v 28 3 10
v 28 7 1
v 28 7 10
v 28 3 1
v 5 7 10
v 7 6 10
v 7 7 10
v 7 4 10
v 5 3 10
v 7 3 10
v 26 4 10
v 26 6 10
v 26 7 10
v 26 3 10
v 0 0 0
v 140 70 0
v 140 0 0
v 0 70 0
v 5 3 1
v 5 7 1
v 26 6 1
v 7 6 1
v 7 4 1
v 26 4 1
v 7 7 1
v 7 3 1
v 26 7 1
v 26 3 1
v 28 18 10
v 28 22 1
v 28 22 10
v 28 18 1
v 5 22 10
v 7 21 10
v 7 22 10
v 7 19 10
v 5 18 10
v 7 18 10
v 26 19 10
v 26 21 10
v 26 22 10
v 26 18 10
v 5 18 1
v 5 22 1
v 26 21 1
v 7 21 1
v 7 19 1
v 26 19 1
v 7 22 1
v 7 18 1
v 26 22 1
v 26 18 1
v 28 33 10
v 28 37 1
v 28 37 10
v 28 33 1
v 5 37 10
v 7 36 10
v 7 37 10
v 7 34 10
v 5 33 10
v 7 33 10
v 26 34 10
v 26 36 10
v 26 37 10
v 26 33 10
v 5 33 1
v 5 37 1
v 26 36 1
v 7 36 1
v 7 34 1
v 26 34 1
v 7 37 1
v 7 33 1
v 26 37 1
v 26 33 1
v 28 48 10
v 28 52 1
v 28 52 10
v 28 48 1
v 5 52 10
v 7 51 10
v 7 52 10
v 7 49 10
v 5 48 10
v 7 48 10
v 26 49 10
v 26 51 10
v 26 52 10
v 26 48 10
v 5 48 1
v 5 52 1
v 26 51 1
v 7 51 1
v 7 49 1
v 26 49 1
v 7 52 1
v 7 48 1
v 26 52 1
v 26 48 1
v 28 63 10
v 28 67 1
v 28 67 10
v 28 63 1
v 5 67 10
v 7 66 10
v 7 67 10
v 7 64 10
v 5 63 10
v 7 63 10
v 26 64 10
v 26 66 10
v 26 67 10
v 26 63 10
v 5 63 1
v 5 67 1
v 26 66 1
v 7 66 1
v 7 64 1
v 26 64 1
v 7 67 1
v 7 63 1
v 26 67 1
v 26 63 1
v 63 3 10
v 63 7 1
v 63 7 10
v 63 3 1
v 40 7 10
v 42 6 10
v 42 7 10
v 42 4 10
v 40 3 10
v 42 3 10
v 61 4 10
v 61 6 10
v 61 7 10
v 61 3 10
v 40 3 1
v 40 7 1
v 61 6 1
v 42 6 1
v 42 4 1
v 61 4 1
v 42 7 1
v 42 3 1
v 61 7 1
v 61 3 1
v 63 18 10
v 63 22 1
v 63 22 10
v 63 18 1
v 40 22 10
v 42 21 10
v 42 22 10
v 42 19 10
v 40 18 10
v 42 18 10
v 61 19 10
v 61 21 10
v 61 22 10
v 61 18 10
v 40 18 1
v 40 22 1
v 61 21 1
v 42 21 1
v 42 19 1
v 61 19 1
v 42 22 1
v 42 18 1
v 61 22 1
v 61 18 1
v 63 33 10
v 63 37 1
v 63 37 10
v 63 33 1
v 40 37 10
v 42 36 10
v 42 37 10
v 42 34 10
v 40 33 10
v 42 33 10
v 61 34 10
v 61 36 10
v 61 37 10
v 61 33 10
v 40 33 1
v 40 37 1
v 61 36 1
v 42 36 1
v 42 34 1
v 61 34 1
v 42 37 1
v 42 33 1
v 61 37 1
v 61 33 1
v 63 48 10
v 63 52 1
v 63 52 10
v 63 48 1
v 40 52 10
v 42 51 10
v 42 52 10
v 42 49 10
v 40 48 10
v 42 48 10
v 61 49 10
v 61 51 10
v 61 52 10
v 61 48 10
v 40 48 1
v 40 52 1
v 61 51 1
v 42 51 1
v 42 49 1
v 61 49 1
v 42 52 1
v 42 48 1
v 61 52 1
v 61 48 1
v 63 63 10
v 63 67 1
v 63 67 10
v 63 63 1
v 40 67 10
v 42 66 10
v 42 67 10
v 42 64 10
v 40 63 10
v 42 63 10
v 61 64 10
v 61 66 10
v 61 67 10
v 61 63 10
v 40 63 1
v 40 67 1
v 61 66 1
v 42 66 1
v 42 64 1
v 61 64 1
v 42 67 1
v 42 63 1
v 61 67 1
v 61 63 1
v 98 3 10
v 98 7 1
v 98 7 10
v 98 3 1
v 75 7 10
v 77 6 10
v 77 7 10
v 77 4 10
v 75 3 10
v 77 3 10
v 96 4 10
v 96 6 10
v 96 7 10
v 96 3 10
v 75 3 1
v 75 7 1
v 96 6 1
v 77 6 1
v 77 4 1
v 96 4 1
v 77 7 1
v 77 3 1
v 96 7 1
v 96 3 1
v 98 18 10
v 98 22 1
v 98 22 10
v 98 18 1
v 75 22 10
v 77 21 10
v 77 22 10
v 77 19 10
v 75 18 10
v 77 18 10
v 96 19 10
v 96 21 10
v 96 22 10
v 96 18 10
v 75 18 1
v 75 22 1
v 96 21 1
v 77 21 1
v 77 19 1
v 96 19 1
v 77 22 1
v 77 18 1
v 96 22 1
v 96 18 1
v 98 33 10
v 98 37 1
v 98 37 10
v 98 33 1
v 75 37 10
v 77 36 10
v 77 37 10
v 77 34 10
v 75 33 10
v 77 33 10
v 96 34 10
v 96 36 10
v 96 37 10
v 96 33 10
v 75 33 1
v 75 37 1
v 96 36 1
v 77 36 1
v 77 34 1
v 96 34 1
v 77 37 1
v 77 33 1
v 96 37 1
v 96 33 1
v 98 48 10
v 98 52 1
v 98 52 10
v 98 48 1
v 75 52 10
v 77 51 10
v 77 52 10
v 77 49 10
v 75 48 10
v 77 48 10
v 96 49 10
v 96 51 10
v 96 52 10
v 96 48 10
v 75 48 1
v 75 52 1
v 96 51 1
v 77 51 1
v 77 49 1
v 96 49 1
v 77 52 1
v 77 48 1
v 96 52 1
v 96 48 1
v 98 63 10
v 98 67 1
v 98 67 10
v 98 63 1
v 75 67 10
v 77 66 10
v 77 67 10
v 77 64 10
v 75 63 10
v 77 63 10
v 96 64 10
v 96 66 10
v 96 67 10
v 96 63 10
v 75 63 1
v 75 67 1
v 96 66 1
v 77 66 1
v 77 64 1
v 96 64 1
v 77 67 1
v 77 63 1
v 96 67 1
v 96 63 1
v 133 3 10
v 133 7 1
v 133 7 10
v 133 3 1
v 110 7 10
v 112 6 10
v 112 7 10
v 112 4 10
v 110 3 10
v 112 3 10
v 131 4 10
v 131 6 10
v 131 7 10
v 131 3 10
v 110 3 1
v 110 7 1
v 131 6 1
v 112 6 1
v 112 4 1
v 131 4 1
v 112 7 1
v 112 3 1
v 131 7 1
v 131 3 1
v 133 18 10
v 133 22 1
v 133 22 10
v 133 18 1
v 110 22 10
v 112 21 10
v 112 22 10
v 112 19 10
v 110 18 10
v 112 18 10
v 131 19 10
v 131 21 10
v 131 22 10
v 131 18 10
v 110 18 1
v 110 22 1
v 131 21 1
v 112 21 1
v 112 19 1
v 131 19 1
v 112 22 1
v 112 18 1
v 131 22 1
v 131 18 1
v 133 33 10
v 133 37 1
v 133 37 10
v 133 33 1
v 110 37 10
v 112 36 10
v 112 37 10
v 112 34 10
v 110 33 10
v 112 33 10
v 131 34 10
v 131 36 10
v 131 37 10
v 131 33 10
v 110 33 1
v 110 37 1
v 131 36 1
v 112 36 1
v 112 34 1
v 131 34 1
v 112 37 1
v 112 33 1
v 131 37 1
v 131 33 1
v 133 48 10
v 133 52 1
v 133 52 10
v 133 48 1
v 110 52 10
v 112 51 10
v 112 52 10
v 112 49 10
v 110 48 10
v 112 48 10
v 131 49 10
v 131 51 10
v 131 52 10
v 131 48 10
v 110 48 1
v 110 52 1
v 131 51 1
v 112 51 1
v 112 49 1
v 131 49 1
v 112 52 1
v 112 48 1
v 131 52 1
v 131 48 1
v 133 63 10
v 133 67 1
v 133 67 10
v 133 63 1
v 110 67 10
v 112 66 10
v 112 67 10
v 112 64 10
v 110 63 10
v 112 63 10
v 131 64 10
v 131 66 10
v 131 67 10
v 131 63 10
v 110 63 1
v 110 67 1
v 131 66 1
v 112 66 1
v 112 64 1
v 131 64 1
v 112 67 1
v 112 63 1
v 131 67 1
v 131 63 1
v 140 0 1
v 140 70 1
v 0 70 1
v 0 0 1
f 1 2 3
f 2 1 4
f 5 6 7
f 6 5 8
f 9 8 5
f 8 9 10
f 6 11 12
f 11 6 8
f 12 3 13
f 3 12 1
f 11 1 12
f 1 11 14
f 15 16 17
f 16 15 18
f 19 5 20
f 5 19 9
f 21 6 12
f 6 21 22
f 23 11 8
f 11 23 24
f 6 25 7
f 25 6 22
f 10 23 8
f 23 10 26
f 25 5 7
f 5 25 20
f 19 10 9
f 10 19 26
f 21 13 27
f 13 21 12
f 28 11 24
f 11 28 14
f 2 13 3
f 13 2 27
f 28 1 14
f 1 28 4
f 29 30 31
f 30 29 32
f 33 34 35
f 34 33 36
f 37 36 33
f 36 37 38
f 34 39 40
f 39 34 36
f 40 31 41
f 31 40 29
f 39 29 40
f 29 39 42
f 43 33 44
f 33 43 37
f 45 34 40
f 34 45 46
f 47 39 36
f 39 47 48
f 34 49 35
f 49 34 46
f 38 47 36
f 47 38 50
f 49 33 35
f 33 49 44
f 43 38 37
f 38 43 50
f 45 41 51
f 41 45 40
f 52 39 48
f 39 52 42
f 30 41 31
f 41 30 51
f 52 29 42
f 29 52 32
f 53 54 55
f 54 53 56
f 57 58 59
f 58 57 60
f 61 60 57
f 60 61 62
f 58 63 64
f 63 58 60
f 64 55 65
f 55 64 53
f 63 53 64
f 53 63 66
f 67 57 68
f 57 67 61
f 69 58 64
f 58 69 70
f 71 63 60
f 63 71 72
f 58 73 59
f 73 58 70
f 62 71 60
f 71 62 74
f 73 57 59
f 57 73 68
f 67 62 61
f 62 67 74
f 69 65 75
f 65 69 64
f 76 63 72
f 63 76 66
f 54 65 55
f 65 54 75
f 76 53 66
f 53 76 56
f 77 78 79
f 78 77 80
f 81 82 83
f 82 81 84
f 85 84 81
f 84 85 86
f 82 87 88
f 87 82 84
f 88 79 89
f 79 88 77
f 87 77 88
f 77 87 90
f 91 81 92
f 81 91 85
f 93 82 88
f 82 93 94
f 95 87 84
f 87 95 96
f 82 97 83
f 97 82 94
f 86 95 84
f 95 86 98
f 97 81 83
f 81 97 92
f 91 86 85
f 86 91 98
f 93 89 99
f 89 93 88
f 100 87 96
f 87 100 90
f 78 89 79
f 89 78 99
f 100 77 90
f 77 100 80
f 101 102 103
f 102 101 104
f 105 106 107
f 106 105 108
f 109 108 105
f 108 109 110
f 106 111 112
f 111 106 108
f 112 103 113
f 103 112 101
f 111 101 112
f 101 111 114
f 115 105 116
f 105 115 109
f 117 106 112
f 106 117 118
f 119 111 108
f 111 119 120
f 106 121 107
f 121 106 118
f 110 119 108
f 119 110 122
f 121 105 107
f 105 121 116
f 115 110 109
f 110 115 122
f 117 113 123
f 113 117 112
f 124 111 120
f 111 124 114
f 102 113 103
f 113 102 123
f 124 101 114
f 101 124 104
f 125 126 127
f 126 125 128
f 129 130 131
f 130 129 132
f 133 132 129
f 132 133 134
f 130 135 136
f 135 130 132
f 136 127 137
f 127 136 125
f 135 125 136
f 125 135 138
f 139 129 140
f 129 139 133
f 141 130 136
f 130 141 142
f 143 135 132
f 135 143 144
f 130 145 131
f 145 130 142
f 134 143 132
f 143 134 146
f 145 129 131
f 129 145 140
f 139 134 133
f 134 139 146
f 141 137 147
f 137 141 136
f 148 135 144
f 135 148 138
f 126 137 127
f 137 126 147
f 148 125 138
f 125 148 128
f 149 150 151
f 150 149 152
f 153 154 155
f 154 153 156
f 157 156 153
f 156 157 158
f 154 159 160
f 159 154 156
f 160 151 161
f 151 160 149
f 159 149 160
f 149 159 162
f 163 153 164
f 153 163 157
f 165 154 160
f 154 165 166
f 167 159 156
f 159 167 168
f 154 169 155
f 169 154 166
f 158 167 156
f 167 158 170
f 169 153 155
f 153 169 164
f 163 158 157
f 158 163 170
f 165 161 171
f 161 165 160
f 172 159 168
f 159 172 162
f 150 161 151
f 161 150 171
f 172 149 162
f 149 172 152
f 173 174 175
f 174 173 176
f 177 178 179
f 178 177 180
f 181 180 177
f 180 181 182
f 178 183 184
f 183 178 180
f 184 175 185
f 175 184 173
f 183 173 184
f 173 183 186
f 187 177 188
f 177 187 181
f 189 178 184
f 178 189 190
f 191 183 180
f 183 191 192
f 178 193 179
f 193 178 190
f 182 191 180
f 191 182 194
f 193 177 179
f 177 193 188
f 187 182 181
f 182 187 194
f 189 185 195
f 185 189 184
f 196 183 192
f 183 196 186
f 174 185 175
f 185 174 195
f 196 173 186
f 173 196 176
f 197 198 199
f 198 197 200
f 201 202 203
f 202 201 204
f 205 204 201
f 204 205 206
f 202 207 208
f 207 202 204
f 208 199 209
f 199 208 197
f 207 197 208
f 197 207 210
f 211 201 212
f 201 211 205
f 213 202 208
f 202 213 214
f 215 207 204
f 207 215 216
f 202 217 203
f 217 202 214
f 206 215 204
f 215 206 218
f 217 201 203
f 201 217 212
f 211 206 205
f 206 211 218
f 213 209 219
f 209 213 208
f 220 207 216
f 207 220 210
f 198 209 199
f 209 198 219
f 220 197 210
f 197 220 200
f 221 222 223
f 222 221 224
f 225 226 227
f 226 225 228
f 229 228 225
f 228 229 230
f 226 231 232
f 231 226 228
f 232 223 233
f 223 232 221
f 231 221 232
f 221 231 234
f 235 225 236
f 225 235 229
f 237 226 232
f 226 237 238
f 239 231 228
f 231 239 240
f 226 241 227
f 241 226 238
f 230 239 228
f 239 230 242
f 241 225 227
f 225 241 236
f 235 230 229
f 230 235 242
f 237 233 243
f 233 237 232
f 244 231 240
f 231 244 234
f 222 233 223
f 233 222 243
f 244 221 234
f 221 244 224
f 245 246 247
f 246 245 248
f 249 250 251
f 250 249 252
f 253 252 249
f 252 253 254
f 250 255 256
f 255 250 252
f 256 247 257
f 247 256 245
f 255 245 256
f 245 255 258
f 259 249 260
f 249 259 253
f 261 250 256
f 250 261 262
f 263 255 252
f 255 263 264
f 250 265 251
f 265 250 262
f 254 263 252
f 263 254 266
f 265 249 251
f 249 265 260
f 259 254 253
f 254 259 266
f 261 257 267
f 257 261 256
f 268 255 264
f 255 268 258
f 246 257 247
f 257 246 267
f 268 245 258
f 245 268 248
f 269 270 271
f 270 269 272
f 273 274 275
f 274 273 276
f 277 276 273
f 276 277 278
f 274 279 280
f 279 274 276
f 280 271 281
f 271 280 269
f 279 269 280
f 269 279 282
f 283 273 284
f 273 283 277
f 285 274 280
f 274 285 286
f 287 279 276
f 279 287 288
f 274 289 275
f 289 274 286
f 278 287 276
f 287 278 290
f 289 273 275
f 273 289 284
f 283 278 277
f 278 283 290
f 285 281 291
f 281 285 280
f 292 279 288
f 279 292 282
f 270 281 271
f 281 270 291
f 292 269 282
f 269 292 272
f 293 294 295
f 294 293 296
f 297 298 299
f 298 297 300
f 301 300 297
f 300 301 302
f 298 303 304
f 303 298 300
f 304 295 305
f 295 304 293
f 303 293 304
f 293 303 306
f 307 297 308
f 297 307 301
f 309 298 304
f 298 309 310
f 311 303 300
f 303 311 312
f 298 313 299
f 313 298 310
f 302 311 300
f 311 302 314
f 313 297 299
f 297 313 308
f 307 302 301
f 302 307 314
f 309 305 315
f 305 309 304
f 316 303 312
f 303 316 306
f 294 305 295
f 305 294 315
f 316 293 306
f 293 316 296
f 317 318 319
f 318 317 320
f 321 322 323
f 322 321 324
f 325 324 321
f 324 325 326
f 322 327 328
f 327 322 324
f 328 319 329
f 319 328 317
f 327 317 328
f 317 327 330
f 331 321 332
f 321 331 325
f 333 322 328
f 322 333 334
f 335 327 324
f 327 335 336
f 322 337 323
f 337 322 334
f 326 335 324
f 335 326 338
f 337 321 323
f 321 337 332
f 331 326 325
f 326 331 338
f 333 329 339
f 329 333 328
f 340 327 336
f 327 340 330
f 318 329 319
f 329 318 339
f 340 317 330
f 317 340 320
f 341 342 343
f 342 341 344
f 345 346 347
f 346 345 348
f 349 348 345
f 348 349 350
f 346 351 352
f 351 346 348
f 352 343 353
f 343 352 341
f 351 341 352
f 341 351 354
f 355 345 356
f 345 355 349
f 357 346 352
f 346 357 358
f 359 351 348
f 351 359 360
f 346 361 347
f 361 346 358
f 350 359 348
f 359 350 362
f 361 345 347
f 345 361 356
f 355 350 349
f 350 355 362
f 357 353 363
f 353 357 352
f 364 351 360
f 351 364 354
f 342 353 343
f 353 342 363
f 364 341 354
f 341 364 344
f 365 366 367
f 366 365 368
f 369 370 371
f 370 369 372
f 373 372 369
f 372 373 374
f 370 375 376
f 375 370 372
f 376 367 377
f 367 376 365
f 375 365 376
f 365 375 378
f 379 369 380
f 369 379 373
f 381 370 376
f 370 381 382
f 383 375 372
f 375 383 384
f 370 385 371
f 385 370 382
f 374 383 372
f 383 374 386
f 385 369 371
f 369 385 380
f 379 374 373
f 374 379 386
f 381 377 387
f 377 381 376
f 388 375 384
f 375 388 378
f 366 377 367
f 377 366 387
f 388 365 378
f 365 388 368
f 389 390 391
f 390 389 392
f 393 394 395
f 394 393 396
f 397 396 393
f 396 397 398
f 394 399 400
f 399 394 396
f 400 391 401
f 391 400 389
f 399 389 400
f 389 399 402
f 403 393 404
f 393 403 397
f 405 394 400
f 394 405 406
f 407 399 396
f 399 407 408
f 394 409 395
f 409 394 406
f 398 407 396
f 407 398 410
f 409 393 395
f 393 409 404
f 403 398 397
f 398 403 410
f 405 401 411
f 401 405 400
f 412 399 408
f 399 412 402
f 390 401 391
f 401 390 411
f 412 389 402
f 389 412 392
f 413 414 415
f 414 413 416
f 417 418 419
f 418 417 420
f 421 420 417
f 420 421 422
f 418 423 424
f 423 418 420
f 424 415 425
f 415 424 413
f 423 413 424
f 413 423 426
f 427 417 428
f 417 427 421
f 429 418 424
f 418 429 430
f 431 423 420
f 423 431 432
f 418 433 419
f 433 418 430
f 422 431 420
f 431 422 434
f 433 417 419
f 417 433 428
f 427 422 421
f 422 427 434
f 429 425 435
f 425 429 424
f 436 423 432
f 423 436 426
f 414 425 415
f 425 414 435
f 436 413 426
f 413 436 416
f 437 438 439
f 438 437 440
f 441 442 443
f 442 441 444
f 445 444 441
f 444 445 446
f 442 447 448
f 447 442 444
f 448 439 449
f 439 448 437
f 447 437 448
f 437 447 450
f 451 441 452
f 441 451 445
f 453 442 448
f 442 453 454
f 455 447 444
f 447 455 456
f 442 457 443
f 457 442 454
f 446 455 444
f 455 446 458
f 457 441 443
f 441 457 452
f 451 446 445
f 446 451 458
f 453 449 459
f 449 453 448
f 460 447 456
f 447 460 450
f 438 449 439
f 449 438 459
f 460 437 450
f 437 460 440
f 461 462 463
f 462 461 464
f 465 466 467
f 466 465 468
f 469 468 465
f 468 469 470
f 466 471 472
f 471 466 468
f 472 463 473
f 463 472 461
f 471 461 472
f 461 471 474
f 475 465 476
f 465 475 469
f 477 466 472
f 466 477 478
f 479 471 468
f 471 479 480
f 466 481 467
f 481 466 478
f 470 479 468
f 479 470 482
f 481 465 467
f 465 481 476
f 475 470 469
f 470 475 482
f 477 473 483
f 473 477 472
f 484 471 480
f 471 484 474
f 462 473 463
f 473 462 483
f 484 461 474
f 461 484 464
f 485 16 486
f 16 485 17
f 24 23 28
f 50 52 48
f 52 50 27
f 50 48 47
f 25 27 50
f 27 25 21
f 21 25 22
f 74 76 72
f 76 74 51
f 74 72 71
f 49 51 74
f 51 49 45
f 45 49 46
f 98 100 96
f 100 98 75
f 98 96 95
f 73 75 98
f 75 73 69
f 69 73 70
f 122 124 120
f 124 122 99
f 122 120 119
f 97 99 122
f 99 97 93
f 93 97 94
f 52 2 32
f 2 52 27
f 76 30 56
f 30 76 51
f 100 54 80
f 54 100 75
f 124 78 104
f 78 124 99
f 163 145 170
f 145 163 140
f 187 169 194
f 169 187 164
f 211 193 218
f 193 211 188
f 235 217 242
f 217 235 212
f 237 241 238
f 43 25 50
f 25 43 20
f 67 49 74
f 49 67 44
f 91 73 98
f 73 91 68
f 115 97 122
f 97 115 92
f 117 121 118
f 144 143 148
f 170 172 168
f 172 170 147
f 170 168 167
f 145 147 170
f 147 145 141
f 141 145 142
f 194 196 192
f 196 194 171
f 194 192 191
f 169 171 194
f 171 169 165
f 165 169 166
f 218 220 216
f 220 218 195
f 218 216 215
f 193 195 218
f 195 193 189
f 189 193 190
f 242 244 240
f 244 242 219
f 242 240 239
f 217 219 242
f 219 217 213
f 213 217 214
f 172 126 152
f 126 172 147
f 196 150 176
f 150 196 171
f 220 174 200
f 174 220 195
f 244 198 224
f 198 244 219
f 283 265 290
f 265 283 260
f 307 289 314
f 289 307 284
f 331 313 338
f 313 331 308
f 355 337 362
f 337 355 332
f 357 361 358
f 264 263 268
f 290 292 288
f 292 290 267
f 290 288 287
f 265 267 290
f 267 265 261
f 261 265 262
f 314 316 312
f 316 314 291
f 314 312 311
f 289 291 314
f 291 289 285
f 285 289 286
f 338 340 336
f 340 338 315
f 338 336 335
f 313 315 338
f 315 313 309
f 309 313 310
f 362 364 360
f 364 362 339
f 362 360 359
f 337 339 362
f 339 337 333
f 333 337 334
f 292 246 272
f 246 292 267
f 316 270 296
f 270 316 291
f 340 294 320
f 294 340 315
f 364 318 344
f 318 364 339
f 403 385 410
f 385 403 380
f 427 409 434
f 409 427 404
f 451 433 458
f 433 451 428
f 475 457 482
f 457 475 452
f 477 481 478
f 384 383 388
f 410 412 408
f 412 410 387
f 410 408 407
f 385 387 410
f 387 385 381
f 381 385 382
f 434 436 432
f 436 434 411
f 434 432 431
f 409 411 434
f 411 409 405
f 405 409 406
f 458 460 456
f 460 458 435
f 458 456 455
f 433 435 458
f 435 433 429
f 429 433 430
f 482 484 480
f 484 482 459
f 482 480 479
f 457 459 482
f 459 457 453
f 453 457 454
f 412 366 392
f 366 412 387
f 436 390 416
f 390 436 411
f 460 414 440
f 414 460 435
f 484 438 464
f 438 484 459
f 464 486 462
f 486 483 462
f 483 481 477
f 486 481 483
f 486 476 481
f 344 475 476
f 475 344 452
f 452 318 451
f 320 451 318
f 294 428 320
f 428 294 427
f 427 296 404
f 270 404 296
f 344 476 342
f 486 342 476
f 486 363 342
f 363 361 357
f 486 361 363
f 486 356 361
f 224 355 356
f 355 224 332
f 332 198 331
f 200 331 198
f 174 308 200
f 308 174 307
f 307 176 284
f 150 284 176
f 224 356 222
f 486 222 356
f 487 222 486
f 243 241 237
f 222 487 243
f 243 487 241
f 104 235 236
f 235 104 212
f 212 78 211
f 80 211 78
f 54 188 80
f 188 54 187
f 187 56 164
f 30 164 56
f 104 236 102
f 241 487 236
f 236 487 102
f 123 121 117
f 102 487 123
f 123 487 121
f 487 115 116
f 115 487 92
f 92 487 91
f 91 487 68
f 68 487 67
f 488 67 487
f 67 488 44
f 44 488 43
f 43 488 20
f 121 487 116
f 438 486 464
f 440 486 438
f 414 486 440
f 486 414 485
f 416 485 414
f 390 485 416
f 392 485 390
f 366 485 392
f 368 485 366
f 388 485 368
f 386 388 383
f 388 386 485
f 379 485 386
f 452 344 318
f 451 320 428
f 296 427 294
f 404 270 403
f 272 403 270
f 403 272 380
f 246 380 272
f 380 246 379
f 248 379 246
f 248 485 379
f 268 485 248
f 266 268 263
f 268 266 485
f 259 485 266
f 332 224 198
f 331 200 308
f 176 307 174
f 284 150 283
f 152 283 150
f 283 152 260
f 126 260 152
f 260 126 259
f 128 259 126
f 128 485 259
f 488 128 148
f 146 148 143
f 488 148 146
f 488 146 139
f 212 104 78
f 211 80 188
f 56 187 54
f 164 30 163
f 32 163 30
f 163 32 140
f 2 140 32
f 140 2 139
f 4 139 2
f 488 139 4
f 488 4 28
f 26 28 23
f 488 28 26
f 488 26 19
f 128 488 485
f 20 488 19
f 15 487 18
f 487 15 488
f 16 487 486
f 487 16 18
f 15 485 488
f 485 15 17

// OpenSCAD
$fn=360;
//67x93x22
x=140;
y=70;
z=1;
translate([0,0,0])
cube([x,y,z]);
for ( x1= [5,40,75,110] ) {
  for ( y1= [4,19,34,49,64] ) {  
    translate([x1,y1,0])
    cube([23,2,10]);
    translate([x1,y1-1,0])
    cube([2,4,10]);
    translate([x1+21,y1-1,0])
    cube([2,4,10]);
  }
}
